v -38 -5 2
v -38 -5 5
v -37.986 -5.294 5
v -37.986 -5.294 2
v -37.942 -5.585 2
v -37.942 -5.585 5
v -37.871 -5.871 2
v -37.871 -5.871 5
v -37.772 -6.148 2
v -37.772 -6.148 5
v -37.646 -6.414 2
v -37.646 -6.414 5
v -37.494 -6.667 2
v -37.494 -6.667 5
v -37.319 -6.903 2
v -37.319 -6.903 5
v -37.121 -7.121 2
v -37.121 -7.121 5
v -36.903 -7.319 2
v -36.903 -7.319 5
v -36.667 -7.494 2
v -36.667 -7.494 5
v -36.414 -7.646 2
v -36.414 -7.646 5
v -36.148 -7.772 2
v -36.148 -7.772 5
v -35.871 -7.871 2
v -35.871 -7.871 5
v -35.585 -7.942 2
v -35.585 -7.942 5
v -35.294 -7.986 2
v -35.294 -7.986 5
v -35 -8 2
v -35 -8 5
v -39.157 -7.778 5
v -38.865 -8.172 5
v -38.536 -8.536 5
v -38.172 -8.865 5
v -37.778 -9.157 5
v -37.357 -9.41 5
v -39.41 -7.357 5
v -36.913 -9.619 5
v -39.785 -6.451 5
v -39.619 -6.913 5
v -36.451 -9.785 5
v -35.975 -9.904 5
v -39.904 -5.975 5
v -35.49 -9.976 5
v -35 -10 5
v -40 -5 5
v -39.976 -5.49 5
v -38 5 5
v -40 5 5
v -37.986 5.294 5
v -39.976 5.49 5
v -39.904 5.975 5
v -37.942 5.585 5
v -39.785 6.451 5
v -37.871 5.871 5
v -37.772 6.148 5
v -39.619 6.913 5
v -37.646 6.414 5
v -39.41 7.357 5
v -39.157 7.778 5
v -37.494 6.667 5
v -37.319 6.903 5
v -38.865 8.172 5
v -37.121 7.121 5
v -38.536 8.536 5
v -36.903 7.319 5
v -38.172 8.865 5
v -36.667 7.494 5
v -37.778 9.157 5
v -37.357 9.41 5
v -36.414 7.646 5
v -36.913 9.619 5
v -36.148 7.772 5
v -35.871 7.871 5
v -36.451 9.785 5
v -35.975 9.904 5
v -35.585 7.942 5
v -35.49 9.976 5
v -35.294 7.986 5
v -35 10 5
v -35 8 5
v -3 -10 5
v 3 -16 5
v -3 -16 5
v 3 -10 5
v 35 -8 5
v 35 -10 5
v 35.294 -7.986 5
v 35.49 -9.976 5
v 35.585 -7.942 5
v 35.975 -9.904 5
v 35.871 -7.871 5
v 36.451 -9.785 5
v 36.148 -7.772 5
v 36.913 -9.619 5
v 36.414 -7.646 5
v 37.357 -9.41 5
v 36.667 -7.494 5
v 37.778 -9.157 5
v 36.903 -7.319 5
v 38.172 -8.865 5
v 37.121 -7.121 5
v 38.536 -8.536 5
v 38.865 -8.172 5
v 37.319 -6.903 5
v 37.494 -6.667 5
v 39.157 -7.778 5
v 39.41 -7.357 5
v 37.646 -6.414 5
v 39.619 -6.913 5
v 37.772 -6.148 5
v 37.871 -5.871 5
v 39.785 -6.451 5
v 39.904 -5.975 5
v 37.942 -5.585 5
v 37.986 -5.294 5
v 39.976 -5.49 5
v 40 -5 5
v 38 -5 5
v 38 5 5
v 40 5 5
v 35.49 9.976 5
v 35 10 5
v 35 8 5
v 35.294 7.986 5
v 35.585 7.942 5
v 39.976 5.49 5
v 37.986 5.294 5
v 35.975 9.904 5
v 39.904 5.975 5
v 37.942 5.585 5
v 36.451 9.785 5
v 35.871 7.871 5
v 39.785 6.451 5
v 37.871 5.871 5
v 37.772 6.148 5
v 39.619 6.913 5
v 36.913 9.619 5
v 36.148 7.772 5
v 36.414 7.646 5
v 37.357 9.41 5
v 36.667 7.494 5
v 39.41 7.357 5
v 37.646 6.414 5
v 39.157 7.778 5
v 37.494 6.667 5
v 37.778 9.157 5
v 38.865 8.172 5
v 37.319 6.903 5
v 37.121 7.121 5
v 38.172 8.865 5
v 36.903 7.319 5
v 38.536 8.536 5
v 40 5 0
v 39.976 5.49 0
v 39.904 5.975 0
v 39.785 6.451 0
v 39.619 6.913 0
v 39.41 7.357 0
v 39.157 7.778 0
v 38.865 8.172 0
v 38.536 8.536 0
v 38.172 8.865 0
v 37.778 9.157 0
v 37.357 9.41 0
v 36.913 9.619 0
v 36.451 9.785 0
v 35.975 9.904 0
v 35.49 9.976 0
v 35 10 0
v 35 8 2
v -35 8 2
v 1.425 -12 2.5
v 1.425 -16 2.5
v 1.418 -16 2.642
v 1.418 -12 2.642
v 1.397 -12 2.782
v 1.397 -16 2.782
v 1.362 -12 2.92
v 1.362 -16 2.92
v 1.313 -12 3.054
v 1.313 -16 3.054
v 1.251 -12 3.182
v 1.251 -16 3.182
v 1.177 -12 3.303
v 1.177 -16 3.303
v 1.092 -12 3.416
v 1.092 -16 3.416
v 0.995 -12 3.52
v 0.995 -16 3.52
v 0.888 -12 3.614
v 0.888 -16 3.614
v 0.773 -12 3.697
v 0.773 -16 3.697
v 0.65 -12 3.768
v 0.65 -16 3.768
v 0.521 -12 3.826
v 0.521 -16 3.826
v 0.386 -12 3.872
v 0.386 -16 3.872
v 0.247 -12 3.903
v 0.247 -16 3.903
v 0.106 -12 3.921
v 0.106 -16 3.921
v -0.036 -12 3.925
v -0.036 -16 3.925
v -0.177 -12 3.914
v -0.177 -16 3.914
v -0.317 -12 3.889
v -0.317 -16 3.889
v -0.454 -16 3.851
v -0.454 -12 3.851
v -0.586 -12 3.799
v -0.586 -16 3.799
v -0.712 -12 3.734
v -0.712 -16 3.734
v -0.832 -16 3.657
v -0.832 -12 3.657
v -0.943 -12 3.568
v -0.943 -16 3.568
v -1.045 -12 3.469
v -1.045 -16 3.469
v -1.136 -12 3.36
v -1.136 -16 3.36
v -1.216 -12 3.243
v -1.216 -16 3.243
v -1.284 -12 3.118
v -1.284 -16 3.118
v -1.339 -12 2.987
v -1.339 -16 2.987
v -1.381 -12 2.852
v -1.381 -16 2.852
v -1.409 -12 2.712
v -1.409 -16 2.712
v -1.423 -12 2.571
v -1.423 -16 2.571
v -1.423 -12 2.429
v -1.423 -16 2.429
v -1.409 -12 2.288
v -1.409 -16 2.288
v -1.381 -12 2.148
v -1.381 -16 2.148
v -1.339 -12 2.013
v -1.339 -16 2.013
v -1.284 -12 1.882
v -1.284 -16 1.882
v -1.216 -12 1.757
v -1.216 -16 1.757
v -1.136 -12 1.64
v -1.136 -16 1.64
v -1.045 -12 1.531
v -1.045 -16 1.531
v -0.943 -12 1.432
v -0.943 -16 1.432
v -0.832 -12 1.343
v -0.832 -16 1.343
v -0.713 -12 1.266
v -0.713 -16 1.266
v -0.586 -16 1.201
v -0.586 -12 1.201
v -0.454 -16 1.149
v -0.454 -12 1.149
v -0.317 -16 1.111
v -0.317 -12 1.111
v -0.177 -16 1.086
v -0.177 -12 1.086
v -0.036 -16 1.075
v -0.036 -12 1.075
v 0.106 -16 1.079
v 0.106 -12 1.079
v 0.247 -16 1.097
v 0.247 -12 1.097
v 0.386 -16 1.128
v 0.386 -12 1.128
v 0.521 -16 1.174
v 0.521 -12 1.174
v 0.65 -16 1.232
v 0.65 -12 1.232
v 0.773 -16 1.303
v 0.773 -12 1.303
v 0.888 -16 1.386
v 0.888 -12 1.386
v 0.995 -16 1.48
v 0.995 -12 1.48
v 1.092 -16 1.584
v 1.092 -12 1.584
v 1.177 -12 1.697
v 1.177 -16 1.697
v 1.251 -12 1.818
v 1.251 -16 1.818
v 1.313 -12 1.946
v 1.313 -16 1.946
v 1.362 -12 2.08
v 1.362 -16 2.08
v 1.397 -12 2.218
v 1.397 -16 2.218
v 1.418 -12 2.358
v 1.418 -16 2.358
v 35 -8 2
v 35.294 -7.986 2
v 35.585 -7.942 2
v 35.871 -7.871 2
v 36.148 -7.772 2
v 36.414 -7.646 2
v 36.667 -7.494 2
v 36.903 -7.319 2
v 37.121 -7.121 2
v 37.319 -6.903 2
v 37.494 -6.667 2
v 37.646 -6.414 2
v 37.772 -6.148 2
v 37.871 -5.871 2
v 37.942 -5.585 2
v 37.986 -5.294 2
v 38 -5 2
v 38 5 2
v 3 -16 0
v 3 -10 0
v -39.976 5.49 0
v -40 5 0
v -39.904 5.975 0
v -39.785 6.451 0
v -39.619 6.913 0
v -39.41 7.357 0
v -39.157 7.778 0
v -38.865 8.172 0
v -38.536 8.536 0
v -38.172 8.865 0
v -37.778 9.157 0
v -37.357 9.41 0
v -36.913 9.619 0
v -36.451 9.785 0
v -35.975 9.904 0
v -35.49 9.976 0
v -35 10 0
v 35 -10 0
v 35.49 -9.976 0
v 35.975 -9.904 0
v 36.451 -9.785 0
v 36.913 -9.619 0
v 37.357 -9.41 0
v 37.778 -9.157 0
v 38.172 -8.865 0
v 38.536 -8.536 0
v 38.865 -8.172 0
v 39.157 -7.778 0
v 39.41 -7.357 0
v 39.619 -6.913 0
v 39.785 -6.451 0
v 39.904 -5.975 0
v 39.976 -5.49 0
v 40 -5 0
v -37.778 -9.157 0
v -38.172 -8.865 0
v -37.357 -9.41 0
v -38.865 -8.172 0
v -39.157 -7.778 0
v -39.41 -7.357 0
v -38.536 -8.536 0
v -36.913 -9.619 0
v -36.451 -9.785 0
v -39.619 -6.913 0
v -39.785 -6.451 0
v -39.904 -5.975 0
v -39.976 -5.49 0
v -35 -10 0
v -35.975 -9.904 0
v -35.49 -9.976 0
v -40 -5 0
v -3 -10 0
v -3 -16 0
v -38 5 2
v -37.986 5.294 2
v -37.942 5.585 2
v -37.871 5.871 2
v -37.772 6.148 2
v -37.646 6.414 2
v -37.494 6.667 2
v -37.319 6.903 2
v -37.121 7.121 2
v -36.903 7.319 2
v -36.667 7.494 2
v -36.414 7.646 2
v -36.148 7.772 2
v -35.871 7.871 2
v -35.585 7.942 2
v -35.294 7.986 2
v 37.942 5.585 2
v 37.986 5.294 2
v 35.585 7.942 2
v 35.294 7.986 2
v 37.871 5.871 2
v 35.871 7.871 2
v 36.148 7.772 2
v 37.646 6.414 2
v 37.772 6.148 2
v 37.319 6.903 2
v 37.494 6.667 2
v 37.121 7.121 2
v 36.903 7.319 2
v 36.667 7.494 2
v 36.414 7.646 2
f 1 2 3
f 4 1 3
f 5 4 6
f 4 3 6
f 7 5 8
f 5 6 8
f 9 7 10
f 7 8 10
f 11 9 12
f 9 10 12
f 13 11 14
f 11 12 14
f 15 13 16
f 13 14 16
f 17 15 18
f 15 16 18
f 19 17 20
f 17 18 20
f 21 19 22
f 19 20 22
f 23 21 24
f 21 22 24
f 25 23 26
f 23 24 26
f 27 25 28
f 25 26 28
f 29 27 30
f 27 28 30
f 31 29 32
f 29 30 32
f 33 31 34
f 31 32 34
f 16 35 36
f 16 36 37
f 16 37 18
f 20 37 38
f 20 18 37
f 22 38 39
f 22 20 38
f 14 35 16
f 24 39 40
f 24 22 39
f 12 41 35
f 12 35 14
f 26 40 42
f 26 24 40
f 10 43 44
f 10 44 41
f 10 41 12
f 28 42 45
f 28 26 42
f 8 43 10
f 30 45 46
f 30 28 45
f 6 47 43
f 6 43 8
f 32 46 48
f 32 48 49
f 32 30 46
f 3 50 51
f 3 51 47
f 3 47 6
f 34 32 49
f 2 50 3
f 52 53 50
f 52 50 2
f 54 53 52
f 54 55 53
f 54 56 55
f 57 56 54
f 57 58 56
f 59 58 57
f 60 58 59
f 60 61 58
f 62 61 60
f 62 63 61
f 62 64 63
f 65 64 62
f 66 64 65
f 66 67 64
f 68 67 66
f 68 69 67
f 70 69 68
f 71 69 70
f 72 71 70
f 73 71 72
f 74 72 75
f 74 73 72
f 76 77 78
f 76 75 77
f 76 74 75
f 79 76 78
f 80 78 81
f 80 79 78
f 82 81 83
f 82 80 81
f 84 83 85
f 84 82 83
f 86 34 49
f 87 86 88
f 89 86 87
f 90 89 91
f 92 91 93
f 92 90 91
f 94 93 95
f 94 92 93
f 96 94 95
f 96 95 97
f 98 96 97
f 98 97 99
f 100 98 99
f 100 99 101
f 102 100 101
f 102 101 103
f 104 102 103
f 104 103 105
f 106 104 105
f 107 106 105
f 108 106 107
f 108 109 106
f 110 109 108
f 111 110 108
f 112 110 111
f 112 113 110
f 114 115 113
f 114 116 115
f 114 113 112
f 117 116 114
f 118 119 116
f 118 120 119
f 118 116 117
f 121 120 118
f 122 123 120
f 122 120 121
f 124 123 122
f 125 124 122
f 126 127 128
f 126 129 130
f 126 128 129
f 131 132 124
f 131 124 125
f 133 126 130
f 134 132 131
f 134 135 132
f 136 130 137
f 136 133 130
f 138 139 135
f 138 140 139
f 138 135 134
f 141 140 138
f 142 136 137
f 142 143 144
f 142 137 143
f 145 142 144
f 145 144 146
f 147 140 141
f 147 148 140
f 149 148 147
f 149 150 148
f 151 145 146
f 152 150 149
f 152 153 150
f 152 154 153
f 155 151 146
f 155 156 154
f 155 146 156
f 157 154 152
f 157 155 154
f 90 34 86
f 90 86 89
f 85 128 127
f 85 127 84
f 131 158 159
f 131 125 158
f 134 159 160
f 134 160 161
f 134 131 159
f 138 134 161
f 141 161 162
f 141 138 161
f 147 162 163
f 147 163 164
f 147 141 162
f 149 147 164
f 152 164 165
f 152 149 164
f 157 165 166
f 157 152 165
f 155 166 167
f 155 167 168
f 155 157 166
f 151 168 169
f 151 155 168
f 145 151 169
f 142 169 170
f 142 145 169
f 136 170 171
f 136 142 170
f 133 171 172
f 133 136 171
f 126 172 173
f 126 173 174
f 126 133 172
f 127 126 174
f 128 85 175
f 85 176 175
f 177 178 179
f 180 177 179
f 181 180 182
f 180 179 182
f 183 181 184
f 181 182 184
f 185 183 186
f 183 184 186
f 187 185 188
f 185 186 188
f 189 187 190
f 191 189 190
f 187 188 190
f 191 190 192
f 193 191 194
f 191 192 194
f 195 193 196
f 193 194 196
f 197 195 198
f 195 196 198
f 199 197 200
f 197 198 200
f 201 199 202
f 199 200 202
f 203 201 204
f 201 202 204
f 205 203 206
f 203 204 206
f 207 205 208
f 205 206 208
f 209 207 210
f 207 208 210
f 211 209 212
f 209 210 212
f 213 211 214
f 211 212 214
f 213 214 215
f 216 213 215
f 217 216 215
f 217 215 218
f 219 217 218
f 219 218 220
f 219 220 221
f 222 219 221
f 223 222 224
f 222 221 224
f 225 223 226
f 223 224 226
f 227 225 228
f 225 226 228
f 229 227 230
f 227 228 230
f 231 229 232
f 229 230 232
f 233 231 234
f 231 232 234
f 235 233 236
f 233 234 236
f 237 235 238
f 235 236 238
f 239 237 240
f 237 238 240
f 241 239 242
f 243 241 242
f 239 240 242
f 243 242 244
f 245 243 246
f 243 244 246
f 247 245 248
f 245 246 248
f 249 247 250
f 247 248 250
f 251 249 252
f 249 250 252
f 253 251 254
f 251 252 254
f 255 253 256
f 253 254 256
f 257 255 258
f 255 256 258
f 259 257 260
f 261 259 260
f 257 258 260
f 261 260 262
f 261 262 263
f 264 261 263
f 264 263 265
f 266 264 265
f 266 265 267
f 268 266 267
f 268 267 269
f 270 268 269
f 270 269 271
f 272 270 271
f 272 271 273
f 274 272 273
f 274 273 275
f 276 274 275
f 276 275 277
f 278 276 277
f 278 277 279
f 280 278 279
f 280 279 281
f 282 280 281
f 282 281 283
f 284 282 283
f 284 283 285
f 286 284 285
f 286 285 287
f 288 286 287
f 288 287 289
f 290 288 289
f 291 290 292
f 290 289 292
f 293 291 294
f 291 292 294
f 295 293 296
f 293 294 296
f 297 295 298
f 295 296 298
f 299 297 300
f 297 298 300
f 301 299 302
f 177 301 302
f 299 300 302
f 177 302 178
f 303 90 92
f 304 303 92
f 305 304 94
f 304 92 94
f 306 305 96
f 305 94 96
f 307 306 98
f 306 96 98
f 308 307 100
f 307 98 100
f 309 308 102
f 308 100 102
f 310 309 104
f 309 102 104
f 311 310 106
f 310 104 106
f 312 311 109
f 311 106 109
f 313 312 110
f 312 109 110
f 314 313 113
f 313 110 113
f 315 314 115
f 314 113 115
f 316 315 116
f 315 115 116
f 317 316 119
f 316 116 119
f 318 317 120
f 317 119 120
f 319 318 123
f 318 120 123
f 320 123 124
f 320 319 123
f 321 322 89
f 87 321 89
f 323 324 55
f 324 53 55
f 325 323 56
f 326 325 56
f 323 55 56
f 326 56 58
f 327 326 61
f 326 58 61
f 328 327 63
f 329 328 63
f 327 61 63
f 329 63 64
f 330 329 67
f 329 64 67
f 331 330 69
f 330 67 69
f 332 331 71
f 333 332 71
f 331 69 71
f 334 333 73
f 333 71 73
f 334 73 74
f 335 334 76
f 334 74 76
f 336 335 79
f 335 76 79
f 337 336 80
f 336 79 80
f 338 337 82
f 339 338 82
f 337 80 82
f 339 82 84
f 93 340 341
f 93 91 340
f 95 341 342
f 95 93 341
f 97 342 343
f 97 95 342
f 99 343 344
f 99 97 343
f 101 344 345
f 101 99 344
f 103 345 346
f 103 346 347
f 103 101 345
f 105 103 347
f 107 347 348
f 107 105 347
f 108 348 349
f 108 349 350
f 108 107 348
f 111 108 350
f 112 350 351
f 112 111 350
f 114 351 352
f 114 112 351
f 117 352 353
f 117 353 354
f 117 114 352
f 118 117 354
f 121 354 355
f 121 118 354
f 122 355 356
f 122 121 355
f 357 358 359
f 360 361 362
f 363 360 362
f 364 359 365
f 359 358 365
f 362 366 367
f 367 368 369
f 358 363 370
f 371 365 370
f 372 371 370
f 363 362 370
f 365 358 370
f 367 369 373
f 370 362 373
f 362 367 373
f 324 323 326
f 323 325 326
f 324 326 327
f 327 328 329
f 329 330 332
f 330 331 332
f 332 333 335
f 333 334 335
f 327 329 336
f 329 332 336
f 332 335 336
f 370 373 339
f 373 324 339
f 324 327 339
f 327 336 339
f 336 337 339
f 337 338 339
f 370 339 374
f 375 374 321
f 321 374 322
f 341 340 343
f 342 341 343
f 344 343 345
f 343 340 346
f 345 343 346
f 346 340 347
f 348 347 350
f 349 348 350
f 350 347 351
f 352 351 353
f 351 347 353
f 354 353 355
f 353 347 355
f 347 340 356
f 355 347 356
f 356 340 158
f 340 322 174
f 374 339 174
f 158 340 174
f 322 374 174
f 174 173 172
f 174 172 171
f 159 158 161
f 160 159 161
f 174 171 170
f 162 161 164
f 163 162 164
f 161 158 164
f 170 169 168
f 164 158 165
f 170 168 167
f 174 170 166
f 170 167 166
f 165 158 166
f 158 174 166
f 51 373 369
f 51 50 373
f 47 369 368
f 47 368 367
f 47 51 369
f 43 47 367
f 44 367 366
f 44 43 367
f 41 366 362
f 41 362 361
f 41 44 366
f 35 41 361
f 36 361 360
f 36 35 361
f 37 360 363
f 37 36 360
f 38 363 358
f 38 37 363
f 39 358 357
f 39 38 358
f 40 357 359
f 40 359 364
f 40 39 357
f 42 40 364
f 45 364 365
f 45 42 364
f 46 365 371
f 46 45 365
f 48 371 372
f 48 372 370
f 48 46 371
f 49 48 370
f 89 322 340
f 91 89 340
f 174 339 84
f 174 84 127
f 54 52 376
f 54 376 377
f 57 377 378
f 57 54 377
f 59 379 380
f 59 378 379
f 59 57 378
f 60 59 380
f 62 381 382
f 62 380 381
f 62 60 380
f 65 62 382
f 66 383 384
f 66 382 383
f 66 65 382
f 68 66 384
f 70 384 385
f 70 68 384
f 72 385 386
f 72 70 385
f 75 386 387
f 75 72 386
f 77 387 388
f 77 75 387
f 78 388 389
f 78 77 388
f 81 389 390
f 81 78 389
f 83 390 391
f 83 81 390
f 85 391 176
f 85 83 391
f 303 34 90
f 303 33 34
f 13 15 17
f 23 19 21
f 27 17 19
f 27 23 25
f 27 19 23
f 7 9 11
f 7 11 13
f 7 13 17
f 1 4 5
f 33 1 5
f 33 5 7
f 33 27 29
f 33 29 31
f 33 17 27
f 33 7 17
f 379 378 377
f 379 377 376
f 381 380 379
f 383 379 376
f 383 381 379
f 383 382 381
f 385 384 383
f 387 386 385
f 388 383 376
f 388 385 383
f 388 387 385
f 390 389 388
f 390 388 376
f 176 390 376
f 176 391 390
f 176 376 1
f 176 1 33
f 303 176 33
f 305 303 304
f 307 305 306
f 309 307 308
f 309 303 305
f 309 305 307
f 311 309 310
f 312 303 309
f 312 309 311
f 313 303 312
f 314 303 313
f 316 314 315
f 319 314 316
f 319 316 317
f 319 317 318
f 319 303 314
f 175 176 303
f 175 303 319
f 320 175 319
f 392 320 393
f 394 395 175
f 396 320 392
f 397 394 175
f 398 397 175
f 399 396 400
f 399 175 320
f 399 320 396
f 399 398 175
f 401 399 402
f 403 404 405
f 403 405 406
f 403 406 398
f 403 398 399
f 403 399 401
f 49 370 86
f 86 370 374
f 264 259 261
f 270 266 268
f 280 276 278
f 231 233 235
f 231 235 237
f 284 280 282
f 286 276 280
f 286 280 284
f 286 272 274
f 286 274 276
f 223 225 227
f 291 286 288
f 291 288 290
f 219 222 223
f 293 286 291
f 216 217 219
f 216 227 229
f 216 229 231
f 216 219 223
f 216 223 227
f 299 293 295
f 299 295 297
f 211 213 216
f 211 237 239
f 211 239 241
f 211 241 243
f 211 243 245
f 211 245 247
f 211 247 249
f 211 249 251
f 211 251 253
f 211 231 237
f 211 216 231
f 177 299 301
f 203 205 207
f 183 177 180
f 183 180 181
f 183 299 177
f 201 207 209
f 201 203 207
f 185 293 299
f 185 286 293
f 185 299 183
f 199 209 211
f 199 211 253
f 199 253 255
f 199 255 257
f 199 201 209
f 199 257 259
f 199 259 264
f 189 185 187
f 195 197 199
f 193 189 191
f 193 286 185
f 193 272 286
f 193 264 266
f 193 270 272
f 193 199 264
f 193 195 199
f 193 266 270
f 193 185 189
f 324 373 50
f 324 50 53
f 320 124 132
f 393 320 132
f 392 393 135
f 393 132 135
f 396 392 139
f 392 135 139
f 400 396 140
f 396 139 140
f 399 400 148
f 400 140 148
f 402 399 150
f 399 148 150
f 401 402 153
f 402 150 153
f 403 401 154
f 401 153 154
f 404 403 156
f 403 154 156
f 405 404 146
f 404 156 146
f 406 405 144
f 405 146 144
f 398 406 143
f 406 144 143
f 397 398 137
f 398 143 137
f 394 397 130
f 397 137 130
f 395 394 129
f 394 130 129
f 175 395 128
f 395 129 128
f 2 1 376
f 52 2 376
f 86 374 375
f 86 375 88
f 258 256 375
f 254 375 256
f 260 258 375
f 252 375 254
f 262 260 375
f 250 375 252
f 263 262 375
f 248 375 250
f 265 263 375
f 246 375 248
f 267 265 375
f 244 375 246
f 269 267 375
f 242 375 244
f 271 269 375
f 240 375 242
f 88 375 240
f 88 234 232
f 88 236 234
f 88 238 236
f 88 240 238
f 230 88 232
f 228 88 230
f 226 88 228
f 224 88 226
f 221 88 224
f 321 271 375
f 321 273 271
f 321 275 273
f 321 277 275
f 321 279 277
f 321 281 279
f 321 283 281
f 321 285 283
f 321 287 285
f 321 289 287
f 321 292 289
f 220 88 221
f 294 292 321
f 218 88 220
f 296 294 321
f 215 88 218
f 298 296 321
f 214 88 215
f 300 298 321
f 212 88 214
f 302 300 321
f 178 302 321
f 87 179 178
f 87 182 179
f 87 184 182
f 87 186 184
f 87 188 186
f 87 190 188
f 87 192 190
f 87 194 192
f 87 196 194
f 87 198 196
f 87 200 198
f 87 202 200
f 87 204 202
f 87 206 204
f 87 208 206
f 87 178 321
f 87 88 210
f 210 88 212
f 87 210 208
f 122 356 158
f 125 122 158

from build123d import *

# Parameters (mm, degrees)
SKETCH2_W           = 80
SKETCH2_H           = 20
BOSS_EXTRUDE1_DEPTH = 5
FILLET1_R           = 5
SHELL1_T            = -2
SKETCH3_W           = 6
SKETCH3_H           = 5
BOSS_EXTRUDE2_DEPTH = 6
SKETCH4_R           = 1.425
CUT_EXTRUDE1_DEPTH  = 4


with BuildPart() as part:
    # Sketch2 → Boss-Extrude1 (new body)
    with BuildSketch(Plane.XY):
        Rectangle(SKETCH2_W, SKETCH2_H)
    extrude(amount=BOSS_EXTRUDE1_DEPTH)

    # Fillet1
    fillet1_edges = [part.edges().sort_by_distance(p)[0] for p in [
        (-40, 10, 2.5),
        (40, 10, 2.5),
        (40, -10, 2.5),
        (-40, -10, 2.5),
    ]]
    fillet(fillet1_edges, radius=FILLET1_R)

    # Shell1
    shell1_openings = [part.faces().sort_by_distance(p)[0] for p in [
        (0, 0, 5),
    ]]
    offset(amount=SHELL1_T, openings=shell1_openings, kind=Kind.INTERSECTION)

    # Sketch3 → Boss-Extrude2 (add)
    with BuildSketch(Plane.XZ.offset(10)):
        with Locations((0, 2.5)):
            Rectangle(SKETCH3_W, SKETCH3_H)
    extrude(amount=BOSS_EXTRUDE2_DEPTH)

    # Sketch4 → Cut-Extrude1 (cut)
    with BuildSketch(Plane.XZ.offset(16)):
        with Locations((0, 2.5)):
            Circle(SKETCH4_R)
    extrude(amount=-CUT_EXTRUDE1_DEPTH, mode=Mode.SUBTRACT)


solid = part.part
